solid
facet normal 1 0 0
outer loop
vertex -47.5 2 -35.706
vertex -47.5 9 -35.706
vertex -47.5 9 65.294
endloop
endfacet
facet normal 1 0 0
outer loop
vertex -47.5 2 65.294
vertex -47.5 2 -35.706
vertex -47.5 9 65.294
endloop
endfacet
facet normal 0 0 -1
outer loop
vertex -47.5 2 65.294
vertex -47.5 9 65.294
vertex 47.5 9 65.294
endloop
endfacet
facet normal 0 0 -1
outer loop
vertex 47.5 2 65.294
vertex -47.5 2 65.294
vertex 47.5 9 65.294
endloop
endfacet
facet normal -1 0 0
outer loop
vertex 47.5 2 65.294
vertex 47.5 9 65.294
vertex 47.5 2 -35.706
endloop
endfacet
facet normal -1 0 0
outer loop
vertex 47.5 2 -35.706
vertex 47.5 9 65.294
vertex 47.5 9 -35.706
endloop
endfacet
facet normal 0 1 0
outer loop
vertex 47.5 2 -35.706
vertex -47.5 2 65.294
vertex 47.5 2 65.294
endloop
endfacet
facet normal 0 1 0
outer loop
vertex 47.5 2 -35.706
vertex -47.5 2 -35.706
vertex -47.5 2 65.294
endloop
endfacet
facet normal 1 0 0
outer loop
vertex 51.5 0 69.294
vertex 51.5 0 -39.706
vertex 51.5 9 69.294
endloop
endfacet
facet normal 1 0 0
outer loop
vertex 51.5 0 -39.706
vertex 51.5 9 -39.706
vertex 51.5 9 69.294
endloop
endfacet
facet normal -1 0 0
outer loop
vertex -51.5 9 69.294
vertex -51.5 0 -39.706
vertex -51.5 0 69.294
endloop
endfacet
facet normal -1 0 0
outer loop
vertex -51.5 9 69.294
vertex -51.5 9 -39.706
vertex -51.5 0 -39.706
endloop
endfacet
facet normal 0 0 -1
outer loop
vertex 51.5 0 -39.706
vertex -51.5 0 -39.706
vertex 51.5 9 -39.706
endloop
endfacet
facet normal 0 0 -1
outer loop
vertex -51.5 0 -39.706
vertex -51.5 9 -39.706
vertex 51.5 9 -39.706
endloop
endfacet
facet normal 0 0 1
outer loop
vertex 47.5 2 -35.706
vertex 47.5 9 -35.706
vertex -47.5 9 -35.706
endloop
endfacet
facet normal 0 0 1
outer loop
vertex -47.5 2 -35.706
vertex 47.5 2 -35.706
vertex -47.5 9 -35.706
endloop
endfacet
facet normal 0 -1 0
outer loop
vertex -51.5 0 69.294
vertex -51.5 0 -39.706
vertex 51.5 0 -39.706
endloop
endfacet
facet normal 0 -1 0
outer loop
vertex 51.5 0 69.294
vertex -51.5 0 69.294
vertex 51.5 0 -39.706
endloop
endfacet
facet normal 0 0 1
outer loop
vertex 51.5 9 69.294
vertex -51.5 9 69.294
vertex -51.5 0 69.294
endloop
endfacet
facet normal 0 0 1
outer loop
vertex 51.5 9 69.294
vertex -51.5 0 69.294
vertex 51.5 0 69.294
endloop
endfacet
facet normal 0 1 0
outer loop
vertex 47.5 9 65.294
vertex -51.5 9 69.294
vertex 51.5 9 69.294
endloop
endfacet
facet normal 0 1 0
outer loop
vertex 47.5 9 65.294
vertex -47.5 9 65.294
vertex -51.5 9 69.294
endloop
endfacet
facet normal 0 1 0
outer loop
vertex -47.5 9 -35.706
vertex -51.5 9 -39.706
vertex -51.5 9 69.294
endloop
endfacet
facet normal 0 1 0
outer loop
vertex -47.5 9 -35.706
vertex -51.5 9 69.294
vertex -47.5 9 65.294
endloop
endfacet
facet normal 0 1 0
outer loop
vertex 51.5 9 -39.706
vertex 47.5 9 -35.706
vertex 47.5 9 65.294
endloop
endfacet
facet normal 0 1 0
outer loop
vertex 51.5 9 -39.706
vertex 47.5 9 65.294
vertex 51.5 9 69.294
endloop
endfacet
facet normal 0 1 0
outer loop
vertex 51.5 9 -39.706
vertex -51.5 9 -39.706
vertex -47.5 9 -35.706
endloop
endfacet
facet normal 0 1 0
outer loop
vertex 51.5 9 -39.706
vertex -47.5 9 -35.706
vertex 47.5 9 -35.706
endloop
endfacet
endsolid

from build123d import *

# Parameters (mm, degrees)
SKETCH1_W           = 95
SKETCH1_H           = 101
BOSS_EXTRUDE1_DEPTH = 2
SKETCH2_W           = 103
SKETCH2_H           = 109
BOSS_EXTRUDE2_DEPTH = 7
CUT_EXTRUDE1_DEPTH  = 7
SKETCH4_W           = 103
SKETCH4_H           = 109
BOSS_EXTRUDE9_DEPTH = 2


with BuildPart() as part:
    # Sketch1 → Boss-Extrude1 (new body)
    with BuildSketch(Plane(origin=(0, 0, 0), x_dir=(1, 0, 0), z_dir=(0, 1, 0))):
        with Locations((0, -14.793667886)):
            Rectangle(SKETCH1_W, SKETCH1_H)
    extrude(amount=BOSS_EXTRUDE1_DEPTH)

    # Sketch2 → Boss-Extrude2 (add)
    with BuildSketch(Plane(origin=(0, 2, 0), x_dir=(1, 0, 0), z_dir=(0, 1, 0))):
        with Locations((0, -14.793667886)):
            Rectangle(SKETCH2_W, SKETCH2_H)
    extrude(amount=BOSS_EXTRUDE2_DEPTH)

    # Sketch3 → Cut-Extrude1 (cut)
    with BuildSketch(Plane(origin=(0, 9, 0), x_dir=(1, 0, 0), z_dir=(0, 1, 0))):
        Polygon((47.5, -65.060658177), (-47.5, 35.473322405), (-47.5, -65.293667886), (47.5, -65.293667886), align=None)
        Polygon((-47.5, 35.706332114), (-47.5, 35.473322405), (47.5, -65.060658177), (47.5, 35.706332114), align=None)
    extrude(amount=-CUT_EXTRUDE1_DEPTH, mode=Mode.SUBTRACT)

    # Sketch4 → Boss-Extrude9 (add, through all)
    with BuildSketch(Plane.XZ.offset(-2)):
        with Locations((0, 14.793667886)):
            Rectangle(SKETCH4_W, SKETCH4_H)
    extrude(amount=BOSS_EXTRUDE9_DEPTH)


solid = part.part
